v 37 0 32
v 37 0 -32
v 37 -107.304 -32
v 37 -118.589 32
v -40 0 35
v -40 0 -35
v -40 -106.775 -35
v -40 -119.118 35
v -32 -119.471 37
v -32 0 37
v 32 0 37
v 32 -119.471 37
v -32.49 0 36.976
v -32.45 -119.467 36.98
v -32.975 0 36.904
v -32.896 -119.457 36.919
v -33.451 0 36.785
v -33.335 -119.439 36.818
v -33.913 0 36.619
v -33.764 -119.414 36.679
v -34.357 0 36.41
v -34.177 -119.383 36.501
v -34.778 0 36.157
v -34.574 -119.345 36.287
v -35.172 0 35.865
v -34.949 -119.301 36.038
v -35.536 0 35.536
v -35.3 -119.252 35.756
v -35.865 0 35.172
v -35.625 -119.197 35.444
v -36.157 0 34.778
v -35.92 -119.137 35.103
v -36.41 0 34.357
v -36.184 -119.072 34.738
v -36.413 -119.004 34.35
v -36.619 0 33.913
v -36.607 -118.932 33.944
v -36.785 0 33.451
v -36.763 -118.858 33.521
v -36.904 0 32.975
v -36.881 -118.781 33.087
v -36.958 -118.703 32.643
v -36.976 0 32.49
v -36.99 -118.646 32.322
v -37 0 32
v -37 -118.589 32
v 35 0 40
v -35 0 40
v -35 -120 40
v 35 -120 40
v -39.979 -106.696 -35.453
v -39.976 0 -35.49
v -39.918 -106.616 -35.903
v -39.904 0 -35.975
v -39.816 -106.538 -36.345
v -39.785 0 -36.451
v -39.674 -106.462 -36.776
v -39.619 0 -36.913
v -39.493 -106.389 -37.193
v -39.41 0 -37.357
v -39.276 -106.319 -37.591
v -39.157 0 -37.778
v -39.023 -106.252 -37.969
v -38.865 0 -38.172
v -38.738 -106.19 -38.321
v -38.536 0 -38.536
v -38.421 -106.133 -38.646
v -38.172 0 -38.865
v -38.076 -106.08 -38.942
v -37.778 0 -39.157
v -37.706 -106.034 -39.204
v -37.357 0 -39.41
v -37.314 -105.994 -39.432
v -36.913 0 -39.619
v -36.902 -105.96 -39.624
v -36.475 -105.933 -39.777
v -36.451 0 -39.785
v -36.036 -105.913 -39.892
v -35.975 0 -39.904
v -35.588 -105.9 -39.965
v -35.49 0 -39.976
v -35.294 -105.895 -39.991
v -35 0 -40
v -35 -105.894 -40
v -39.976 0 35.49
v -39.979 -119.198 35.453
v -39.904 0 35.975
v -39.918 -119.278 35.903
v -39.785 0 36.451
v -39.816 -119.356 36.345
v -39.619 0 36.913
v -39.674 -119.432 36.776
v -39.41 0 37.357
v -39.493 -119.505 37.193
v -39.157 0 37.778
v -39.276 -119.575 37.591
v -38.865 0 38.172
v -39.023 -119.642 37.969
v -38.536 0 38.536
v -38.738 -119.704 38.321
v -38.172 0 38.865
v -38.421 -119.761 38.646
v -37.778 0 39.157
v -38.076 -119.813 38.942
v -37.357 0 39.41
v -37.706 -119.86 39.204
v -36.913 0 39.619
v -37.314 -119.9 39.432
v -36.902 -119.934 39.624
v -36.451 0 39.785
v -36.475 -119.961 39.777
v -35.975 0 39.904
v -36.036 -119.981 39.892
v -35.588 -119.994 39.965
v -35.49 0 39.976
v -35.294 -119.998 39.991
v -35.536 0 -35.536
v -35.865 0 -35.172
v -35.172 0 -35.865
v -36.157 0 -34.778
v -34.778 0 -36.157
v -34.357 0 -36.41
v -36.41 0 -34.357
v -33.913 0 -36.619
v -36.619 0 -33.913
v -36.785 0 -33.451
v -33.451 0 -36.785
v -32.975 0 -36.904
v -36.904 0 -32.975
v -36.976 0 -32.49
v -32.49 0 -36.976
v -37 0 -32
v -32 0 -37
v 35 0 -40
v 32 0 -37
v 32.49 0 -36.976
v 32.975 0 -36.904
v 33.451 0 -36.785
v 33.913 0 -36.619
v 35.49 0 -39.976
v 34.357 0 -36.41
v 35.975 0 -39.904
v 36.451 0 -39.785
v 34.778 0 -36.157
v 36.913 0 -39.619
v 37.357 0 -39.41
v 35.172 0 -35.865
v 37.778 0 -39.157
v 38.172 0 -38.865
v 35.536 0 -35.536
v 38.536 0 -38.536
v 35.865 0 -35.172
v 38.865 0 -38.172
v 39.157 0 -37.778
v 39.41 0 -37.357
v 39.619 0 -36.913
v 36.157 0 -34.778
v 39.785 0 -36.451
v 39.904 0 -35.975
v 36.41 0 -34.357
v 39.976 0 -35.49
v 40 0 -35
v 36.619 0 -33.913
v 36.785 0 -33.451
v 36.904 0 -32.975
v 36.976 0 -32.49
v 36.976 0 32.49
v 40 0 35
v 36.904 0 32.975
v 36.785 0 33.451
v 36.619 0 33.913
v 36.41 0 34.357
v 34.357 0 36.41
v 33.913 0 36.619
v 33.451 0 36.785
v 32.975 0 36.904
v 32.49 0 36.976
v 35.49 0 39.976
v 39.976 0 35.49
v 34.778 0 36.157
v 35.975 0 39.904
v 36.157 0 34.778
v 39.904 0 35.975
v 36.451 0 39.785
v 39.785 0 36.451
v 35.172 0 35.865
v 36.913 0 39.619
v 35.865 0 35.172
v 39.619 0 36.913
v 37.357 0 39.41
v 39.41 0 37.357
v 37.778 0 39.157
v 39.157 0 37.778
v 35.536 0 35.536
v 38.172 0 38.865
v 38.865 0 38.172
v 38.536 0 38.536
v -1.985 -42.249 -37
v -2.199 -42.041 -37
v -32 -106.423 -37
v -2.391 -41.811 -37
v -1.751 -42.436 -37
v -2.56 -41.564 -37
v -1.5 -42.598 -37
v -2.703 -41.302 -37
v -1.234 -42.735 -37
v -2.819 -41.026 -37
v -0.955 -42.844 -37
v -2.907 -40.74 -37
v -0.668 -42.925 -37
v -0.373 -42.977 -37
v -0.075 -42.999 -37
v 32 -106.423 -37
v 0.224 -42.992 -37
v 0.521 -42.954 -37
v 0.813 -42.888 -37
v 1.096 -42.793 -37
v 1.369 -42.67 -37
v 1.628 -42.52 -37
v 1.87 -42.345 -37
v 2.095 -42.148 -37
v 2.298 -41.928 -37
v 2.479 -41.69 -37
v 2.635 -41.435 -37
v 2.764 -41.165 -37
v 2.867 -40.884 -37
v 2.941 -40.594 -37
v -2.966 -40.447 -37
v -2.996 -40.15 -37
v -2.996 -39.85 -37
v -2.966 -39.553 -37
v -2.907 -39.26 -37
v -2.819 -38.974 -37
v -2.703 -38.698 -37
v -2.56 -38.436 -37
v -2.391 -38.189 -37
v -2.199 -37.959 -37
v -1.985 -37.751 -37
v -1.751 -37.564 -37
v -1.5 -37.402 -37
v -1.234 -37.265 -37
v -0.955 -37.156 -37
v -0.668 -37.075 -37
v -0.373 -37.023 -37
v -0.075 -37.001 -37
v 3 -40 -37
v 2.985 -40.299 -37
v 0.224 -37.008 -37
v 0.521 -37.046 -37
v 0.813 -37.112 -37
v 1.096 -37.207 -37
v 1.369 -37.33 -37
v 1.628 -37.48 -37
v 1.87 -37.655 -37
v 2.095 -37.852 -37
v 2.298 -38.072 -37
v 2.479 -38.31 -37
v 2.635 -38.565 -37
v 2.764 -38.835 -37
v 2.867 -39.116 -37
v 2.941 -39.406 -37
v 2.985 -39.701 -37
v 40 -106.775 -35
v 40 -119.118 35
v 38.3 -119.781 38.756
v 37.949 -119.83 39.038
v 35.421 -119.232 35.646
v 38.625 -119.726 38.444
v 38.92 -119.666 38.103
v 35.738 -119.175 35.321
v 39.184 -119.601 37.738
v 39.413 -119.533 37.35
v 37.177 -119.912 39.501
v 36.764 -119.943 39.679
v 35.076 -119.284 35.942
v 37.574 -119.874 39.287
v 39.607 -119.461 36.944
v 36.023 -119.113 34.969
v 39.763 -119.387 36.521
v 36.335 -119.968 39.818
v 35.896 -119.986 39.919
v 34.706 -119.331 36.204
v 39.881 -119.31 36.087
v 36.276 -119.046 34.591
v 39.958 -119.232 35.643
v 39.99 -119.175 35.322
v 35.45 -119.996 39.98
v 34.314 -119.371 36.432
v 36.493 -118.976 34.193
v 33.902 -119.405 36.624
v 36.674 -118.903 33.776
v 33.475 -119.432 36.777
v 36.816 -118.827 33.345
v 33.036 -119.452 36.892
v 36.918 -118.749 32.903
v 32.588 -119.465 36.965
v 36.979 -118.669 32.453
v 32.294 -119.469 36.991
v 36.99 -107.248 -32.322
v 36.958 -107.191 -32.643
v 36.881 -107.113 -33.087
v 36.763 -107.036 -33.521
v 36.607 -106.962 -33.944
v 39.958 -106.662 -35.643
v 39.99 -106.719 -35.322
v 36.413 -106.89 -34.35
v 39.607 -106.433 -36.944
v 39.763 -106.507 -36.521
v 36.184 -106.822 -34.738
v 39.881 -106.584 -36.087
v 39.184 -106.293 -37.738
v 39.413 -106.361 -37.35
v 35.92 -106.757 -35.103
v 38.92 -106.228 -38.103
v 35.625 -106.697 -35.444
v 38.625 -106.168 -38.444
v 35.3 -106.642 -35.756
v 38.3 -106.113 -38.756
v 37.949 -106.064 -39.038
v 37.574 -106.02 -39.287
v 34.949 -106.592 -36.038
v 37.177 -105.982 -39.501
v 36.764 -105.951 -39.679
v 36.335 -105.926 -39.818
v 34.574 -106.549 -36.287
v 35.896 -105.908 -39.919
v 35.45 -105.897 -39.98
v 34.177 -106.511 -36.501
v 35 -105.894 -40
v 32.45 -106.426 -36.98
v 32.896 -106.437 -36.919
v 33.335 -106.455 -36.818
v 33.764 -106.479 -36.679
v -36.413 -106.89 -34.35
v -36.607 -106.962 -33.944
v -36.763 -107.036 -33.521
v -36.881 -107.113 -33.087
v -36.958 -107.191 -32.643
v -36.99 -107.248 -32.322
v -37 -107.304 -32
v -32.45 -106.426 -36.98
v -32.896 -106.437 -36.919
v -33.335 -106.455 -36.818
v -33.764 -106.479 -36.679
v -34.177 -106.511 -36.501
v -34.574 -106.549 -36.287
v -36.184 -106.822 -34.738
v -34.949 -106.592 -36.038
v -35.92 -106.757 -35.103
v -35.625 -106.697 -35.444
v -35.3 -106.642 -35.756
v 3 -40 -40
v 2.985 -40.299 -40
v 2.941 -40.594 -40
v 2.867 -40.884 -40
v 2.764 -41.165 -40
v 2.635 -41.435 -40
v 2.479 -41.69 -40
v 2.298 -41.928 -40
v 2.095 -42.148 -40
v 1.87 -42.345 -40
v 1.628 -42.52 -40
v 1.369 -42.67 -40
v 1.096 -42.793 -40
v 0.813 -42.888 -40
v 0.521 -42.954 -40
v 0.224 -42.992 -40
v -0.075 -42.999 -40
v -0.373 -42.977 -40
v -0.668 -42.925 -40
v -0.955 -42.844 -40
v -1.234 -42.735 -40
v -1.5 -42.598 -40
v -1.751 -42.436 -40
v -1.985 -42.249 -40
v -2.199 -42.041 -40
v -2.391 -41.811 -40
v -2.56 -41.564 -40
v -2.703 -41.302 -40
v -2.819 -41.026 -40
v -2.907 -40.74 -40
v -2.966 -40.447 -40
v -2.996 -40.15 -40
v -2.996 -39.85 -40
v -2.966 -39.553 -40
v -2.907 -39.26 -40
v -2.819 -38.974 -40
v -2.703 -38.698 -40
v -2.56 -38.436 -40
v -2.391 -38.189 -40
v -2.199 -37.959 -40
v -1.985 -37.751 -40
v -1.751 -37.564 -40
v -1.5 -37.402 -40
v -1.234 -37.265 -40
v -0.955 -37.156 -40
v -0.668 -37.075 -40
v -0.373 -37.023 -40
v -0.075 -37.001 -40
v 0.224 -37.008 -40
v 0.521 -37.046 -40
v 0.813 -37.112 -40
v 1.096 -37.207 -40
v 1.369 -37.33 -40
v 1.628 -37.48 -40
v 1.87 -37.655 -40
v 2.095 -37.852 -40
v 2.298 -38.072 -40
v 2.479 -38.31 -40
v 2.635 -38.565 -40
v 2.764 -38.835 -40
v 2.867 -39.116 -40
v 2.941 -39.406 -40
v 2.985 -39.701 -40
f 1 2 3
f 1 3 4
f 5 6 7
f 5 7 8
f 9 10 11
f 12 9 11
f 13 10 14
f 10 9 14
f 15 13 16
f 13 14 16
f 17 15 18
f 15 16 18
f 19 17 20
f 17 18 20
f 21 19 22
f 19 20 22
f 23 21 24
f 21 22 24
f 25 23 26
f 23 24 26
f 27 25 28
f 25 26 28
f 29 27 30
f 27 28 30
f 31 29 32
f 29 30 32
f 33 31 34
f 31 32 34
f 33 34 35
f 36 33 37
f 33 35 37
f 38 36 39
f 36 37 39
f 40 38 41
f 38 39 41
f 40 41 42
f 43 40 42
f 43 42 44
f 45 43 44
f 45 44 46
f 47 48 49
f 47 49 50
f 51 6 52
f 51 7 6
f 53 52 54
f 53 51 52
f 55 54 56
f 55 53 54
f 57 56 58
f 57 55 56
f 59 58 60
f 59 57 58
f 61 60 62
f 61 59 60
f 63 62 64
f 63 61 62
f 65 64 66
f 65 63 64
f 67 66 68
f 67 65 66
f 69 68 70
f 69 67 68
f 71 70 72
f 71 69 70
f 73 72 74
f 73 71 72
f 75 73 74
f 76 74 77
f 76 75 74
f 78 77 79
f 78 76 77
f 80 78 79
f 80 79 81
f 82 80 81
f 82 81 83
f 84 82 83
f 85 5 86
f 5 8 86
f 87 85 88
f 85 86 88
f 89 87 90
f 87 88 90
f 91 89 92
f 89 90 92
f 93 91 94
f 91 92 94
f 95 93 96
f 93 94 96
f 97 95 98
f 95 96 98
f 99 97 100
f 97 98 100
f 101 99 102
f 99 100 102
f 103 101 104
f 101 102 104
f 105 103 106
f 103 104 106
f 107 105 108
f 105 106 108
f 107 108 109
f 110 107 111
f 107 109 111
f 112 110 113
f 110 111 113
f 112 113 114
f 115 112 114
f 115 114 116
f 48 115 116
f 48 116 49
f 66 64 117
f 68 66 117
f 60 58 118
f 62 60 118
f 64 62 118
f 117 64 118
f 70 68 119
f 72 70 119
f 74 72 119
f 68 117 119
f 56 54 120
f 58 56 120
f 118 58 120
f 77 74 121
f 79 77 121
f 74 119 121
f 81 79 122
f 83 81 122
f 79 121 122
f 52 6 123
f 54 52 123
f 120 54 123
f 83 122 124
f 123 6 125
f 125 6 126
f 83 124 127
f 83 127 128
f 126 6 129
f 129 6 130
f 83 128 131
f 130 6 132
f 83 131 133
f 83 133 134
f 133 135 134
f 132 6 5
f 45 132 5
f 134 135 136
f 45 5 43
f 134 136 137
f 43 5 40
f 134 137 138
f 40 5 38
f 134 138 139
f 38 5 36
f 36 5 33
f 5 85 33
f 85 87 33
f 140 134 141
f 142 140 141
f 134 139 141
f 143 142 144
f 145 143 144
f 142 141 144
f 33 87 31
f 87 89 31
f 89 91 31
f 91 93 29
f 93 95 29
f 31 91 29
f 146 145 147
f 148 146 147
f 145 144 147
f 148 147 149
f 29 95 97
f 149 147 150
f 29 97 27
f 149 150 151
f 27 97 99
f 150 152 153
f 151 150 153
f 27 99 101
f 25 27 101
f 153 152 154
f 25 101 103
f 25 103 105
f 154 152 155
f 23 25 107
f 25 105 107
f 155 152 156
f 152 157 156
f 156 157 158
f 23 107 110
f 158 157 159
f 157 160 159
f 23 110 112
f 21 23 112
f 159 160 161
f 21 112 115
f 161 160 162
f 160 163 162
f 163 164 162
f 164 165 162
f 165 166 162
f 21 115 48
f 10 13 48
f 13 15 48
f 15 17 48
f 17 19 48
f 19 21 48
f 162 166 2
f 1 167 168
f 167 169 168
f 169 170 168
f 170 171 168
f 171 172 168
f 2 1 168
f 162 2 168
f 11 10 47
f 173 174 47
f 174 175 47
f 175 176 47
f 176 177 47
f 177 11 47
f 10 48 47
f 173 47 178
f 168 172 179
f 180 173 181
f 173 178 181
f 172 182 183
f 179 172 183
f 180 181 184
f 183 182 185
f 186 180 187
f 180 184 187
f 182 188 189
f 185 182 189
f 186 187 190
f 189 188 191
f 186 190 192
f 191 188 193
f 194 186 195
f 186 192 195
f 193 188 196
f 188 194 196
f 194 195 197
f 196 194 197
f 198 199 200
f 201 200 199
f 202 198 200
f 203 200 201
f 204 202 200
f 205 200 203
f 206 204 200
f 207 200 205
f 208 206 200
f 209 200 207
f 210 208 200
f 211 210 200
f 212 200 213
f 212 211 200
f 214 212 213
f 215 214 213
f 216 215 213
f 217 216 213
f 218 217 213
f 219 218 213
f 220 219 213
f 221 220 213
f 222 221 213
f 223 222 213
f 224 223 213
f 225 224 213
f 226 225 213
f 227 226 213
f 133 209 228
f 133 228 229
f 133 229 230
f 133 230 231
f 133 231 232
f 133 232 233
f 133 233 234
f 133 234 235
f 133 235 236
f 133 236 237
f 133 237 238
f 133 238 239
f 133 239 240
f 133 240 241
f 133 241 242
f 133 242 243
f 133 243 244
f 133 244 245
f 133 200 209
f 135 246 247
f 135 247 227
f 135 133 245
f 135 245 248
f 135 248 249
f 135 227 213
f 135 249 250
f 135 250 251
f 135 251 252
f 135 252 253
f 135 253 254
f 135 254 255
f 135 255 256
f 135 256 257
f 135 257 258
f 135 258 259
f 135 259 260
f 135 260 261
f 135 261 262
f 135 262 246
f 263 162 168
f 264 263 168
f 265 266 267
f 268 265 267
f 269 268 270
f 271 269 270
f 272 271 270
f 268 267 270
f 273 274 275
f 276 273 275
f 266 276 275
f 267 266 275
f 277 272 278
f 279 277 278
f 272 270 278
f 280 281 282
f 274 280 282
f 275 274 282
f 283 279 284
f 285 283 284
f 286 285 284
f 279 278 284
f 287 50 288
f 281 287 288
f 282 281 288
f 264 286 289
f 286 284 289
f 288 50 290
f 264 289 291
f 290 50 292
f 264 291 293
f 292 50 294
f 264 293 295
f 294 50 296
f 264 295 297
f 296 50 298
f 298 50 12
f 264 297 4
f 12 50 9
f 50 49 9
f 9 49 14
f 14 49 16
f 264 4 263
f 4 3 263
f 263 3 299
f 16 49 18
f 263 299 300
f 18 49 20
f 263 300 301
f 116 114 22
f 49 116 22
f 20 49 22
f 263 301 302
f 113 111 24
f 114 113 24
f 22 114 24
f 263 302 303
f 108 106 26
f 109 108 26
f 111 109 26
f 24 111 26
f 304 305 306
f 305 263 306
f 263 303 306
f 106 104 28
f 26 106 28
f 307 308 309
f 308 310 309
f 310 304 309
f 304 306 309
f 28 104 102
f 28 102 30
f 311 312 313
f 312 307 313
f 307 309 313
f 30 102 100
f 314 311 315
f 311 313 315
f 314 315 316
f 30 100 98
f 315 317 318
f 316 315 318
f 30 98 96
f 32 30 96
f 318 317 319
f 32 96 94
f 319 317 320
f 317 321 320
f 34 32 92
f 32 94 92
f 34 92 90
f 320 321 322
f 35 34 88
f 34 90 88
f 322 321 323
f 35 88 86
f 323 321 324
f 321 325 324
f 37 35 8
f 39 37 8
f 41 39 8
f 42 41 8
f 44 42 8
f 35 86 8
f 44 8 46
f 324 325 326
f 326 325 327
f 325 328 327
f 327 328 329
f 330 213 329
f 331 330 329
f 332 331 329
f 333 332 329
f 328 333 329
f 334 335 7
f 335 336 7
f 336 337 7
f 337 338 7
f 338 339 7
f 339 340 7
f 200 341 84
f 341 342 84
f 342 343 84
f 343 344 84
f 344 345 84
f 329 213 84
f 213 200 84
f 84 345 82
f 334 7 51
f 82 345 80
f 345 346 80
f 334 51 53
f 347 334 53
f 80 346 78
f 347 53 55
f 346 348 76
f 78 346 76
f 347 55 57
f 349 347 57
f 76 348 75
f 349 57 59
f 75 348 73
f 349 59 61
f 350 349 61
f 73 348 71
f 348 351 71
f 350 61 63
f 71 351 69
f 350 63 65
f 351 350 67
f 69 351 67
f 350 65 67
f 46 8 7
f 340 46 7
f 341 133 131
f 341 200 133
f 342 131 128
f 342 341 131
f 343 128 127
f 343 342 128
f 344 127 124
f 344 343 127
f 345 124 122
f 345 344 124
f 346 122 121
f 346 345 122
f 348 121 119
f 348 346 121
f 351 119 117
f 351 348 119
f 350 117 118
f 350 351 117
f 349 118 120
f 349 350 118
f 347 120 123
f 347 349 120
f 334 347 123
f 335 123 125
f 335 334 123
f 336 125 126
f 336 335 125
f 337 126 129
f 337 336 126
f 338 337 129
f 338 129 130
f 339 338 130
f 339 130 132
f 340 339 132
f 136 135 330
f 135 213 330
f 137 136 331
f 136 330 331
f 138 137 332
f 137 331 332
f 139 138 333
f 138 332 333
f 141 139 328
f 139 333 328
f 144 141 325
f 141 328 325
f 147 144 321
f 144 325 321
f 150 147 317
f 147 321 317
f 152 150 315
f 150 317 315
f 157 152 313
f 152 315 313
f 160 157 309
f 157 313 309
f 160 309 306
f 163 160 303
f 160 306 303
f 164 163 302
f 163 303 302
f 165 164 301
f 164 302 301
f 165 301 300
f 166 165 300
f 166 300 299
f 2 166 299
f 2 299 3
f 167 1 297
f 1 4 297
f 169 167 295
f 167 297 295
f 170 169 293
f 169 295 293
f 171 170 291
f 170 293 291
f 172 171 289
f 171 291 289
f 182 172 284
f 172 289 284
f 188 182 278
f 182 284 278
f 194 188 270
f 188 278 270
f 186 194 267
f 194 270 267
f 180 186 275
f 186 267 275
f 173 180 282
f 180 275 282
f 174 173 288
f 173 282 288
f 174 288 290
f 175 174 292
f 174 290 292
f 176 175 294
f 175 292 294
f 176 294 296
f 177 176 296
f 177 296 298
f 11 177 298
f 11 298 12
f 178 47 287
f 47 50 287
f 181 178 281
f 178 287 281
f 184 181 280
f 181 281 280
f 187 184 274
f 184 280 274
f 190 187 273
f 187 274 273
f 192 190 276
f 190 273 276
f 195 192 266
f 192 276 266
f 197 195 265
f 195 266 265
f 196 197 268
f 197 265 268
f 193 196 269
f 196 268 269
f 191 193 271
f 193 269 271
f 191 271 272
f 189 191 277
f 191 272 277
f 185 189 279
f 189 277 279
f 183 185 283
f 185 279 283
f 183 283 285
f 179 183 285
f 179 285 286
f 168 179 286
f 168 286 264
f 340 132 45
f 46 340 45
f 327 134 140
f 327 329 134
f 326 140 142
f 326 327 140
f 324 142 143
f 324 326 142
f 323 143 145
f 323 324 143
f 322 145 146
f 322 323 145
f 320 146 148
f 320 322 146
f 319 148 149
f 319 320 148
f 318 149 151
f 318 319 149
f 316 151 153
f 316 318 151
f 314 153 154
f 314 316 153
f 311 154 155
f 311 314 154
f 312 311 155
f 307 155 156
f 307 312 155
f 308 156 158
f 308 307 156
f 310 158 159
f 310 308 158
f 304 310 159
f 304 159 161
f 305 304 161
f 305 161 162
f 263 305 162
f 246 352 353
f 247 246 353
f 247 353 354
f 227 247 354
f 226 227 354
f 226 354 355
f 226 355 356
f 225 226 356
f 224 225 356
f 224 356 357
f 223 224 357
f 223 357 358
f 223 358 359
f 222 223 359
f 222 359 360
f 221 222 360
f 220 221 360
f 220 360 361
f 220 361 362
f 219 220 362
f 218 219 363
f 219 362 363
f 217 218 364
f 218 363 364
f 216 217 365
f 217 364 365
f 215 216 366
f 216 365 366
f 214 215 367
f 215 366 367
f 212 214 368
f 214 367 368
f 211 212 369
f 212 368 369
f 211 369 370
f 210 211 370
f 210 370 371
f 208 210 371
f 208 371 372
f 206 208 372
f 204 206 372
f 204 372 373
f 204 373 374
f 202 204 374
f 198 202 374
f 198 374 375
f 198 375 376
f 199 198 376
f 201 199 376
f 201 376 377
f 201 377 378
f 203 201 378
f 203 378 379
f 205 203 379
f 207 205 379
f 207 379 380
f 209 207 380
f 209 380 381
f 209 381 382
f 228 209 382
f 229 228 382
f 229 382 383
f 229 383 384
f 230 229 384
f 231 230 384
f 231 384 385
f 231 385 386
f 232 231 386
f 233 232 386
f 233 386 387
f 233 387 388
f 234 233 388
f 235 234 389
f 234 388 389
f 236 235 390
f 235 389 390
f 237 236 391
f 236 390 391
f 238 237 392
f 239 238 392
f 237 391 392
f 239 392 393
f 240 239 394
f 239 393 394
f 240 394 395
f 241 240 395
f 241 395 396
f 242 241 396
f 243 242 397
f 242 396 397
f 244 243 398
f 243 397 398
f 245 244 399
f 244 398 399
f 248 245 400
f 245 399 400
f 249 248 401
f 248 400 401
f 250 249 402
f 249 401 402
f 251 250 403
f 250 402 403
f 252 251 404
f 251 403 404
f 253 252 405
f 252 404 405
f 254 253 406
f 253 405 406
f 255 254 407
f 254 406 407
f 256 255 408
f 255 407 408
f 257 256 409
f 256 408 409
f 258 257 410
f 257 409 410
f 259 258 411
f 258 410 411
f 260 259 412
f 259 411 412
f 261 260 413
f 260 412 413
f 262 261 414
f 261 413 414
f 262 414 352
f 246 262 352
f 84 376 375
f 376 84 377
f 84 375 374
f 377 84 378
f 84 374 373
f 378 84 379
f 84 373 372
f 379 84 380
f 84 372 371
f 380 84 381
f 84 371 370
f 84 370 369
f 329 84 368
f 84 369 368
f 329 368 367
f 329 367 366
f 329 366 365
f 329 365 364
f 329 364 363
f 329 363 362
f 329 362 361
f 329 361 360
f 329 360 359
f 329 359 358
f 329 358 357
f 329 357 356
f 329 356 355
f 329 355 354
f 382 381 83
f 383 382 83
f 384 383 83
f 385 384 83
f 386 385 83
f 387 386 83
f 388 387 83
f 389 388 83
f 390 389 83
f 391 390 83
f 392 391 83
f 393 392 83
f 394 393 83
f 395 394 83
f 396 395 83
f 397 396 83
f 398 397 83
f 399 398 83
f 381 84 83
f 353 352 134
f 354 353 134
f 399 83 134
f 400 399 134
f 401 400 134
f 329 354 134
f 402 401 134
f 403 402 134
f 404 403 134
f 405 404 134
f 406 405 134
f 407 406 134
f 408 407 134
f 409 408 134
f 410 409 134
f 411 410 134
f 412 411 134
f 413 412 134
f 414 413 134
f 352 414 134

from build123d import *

# Parameters (mm, degrees)
F0_W     = 80
F0_H     = 80
F0_W_2   = 74
F0_H_2   = 74
F1_DEPTH = 120
F3_DEPTH = 80.001
F4_R     = 3
F5_DEPTH = 25
F6_R     = 5


# Not quite as in the source:
# - a feature names something its author has since deleted; it is built from what else it names


with BuildPart() as f1:
    # F0 (on Front) → F1 (new body)
    with BuildSketch(Plane.XZ):
        Rectangle(F0_W, F0_H)
        Rectangle(F0_W_2, F0_H_2, mode=Mode.SUBTRACT)
    extrude(amount=F1_DEPTH)

    # F2 (on face) → F3 (cut, through all)
    with BuildSketch(Plane(origin=(-40, 0, 0), x_dir=(0, -1, 0), z_dir=(-1, 0, 0))):
        Polygon((120, -40), (120, 40), (105.8938415433, -40), align=None)
    extrude(amount=-F3_DEPTH, mode=Mode.SUBTRACT)

    # F4 (on face) → F5 (cut)
    with BuildSketch(Plane(origin=(0, 0, -40), x_dir=(1, 0, 0), z_dir=(0, 0, -1))):
        with Locations((0, 40)):
            Circle(F4_R)
    extrude(amount=-F5_DEPTH, mode=Mode.SUBTRACT)

    # F6
    f6_edges = [f1.edges().sort_by_distance(p)[0] for p in [
        (40, -60, 40),
        (40, -52.946921, -40),
        (-40, -60, 40),
        (-40, -52.946921, -40),
        (37, -59.73551, 37),
        (37, -53.211411, -37),
        (-37, -53.211411, -37),
        (-37, -59.73551, 37),
    ]]
    fillet(f6_edges, radius=F6_R)


solid = f1.part
